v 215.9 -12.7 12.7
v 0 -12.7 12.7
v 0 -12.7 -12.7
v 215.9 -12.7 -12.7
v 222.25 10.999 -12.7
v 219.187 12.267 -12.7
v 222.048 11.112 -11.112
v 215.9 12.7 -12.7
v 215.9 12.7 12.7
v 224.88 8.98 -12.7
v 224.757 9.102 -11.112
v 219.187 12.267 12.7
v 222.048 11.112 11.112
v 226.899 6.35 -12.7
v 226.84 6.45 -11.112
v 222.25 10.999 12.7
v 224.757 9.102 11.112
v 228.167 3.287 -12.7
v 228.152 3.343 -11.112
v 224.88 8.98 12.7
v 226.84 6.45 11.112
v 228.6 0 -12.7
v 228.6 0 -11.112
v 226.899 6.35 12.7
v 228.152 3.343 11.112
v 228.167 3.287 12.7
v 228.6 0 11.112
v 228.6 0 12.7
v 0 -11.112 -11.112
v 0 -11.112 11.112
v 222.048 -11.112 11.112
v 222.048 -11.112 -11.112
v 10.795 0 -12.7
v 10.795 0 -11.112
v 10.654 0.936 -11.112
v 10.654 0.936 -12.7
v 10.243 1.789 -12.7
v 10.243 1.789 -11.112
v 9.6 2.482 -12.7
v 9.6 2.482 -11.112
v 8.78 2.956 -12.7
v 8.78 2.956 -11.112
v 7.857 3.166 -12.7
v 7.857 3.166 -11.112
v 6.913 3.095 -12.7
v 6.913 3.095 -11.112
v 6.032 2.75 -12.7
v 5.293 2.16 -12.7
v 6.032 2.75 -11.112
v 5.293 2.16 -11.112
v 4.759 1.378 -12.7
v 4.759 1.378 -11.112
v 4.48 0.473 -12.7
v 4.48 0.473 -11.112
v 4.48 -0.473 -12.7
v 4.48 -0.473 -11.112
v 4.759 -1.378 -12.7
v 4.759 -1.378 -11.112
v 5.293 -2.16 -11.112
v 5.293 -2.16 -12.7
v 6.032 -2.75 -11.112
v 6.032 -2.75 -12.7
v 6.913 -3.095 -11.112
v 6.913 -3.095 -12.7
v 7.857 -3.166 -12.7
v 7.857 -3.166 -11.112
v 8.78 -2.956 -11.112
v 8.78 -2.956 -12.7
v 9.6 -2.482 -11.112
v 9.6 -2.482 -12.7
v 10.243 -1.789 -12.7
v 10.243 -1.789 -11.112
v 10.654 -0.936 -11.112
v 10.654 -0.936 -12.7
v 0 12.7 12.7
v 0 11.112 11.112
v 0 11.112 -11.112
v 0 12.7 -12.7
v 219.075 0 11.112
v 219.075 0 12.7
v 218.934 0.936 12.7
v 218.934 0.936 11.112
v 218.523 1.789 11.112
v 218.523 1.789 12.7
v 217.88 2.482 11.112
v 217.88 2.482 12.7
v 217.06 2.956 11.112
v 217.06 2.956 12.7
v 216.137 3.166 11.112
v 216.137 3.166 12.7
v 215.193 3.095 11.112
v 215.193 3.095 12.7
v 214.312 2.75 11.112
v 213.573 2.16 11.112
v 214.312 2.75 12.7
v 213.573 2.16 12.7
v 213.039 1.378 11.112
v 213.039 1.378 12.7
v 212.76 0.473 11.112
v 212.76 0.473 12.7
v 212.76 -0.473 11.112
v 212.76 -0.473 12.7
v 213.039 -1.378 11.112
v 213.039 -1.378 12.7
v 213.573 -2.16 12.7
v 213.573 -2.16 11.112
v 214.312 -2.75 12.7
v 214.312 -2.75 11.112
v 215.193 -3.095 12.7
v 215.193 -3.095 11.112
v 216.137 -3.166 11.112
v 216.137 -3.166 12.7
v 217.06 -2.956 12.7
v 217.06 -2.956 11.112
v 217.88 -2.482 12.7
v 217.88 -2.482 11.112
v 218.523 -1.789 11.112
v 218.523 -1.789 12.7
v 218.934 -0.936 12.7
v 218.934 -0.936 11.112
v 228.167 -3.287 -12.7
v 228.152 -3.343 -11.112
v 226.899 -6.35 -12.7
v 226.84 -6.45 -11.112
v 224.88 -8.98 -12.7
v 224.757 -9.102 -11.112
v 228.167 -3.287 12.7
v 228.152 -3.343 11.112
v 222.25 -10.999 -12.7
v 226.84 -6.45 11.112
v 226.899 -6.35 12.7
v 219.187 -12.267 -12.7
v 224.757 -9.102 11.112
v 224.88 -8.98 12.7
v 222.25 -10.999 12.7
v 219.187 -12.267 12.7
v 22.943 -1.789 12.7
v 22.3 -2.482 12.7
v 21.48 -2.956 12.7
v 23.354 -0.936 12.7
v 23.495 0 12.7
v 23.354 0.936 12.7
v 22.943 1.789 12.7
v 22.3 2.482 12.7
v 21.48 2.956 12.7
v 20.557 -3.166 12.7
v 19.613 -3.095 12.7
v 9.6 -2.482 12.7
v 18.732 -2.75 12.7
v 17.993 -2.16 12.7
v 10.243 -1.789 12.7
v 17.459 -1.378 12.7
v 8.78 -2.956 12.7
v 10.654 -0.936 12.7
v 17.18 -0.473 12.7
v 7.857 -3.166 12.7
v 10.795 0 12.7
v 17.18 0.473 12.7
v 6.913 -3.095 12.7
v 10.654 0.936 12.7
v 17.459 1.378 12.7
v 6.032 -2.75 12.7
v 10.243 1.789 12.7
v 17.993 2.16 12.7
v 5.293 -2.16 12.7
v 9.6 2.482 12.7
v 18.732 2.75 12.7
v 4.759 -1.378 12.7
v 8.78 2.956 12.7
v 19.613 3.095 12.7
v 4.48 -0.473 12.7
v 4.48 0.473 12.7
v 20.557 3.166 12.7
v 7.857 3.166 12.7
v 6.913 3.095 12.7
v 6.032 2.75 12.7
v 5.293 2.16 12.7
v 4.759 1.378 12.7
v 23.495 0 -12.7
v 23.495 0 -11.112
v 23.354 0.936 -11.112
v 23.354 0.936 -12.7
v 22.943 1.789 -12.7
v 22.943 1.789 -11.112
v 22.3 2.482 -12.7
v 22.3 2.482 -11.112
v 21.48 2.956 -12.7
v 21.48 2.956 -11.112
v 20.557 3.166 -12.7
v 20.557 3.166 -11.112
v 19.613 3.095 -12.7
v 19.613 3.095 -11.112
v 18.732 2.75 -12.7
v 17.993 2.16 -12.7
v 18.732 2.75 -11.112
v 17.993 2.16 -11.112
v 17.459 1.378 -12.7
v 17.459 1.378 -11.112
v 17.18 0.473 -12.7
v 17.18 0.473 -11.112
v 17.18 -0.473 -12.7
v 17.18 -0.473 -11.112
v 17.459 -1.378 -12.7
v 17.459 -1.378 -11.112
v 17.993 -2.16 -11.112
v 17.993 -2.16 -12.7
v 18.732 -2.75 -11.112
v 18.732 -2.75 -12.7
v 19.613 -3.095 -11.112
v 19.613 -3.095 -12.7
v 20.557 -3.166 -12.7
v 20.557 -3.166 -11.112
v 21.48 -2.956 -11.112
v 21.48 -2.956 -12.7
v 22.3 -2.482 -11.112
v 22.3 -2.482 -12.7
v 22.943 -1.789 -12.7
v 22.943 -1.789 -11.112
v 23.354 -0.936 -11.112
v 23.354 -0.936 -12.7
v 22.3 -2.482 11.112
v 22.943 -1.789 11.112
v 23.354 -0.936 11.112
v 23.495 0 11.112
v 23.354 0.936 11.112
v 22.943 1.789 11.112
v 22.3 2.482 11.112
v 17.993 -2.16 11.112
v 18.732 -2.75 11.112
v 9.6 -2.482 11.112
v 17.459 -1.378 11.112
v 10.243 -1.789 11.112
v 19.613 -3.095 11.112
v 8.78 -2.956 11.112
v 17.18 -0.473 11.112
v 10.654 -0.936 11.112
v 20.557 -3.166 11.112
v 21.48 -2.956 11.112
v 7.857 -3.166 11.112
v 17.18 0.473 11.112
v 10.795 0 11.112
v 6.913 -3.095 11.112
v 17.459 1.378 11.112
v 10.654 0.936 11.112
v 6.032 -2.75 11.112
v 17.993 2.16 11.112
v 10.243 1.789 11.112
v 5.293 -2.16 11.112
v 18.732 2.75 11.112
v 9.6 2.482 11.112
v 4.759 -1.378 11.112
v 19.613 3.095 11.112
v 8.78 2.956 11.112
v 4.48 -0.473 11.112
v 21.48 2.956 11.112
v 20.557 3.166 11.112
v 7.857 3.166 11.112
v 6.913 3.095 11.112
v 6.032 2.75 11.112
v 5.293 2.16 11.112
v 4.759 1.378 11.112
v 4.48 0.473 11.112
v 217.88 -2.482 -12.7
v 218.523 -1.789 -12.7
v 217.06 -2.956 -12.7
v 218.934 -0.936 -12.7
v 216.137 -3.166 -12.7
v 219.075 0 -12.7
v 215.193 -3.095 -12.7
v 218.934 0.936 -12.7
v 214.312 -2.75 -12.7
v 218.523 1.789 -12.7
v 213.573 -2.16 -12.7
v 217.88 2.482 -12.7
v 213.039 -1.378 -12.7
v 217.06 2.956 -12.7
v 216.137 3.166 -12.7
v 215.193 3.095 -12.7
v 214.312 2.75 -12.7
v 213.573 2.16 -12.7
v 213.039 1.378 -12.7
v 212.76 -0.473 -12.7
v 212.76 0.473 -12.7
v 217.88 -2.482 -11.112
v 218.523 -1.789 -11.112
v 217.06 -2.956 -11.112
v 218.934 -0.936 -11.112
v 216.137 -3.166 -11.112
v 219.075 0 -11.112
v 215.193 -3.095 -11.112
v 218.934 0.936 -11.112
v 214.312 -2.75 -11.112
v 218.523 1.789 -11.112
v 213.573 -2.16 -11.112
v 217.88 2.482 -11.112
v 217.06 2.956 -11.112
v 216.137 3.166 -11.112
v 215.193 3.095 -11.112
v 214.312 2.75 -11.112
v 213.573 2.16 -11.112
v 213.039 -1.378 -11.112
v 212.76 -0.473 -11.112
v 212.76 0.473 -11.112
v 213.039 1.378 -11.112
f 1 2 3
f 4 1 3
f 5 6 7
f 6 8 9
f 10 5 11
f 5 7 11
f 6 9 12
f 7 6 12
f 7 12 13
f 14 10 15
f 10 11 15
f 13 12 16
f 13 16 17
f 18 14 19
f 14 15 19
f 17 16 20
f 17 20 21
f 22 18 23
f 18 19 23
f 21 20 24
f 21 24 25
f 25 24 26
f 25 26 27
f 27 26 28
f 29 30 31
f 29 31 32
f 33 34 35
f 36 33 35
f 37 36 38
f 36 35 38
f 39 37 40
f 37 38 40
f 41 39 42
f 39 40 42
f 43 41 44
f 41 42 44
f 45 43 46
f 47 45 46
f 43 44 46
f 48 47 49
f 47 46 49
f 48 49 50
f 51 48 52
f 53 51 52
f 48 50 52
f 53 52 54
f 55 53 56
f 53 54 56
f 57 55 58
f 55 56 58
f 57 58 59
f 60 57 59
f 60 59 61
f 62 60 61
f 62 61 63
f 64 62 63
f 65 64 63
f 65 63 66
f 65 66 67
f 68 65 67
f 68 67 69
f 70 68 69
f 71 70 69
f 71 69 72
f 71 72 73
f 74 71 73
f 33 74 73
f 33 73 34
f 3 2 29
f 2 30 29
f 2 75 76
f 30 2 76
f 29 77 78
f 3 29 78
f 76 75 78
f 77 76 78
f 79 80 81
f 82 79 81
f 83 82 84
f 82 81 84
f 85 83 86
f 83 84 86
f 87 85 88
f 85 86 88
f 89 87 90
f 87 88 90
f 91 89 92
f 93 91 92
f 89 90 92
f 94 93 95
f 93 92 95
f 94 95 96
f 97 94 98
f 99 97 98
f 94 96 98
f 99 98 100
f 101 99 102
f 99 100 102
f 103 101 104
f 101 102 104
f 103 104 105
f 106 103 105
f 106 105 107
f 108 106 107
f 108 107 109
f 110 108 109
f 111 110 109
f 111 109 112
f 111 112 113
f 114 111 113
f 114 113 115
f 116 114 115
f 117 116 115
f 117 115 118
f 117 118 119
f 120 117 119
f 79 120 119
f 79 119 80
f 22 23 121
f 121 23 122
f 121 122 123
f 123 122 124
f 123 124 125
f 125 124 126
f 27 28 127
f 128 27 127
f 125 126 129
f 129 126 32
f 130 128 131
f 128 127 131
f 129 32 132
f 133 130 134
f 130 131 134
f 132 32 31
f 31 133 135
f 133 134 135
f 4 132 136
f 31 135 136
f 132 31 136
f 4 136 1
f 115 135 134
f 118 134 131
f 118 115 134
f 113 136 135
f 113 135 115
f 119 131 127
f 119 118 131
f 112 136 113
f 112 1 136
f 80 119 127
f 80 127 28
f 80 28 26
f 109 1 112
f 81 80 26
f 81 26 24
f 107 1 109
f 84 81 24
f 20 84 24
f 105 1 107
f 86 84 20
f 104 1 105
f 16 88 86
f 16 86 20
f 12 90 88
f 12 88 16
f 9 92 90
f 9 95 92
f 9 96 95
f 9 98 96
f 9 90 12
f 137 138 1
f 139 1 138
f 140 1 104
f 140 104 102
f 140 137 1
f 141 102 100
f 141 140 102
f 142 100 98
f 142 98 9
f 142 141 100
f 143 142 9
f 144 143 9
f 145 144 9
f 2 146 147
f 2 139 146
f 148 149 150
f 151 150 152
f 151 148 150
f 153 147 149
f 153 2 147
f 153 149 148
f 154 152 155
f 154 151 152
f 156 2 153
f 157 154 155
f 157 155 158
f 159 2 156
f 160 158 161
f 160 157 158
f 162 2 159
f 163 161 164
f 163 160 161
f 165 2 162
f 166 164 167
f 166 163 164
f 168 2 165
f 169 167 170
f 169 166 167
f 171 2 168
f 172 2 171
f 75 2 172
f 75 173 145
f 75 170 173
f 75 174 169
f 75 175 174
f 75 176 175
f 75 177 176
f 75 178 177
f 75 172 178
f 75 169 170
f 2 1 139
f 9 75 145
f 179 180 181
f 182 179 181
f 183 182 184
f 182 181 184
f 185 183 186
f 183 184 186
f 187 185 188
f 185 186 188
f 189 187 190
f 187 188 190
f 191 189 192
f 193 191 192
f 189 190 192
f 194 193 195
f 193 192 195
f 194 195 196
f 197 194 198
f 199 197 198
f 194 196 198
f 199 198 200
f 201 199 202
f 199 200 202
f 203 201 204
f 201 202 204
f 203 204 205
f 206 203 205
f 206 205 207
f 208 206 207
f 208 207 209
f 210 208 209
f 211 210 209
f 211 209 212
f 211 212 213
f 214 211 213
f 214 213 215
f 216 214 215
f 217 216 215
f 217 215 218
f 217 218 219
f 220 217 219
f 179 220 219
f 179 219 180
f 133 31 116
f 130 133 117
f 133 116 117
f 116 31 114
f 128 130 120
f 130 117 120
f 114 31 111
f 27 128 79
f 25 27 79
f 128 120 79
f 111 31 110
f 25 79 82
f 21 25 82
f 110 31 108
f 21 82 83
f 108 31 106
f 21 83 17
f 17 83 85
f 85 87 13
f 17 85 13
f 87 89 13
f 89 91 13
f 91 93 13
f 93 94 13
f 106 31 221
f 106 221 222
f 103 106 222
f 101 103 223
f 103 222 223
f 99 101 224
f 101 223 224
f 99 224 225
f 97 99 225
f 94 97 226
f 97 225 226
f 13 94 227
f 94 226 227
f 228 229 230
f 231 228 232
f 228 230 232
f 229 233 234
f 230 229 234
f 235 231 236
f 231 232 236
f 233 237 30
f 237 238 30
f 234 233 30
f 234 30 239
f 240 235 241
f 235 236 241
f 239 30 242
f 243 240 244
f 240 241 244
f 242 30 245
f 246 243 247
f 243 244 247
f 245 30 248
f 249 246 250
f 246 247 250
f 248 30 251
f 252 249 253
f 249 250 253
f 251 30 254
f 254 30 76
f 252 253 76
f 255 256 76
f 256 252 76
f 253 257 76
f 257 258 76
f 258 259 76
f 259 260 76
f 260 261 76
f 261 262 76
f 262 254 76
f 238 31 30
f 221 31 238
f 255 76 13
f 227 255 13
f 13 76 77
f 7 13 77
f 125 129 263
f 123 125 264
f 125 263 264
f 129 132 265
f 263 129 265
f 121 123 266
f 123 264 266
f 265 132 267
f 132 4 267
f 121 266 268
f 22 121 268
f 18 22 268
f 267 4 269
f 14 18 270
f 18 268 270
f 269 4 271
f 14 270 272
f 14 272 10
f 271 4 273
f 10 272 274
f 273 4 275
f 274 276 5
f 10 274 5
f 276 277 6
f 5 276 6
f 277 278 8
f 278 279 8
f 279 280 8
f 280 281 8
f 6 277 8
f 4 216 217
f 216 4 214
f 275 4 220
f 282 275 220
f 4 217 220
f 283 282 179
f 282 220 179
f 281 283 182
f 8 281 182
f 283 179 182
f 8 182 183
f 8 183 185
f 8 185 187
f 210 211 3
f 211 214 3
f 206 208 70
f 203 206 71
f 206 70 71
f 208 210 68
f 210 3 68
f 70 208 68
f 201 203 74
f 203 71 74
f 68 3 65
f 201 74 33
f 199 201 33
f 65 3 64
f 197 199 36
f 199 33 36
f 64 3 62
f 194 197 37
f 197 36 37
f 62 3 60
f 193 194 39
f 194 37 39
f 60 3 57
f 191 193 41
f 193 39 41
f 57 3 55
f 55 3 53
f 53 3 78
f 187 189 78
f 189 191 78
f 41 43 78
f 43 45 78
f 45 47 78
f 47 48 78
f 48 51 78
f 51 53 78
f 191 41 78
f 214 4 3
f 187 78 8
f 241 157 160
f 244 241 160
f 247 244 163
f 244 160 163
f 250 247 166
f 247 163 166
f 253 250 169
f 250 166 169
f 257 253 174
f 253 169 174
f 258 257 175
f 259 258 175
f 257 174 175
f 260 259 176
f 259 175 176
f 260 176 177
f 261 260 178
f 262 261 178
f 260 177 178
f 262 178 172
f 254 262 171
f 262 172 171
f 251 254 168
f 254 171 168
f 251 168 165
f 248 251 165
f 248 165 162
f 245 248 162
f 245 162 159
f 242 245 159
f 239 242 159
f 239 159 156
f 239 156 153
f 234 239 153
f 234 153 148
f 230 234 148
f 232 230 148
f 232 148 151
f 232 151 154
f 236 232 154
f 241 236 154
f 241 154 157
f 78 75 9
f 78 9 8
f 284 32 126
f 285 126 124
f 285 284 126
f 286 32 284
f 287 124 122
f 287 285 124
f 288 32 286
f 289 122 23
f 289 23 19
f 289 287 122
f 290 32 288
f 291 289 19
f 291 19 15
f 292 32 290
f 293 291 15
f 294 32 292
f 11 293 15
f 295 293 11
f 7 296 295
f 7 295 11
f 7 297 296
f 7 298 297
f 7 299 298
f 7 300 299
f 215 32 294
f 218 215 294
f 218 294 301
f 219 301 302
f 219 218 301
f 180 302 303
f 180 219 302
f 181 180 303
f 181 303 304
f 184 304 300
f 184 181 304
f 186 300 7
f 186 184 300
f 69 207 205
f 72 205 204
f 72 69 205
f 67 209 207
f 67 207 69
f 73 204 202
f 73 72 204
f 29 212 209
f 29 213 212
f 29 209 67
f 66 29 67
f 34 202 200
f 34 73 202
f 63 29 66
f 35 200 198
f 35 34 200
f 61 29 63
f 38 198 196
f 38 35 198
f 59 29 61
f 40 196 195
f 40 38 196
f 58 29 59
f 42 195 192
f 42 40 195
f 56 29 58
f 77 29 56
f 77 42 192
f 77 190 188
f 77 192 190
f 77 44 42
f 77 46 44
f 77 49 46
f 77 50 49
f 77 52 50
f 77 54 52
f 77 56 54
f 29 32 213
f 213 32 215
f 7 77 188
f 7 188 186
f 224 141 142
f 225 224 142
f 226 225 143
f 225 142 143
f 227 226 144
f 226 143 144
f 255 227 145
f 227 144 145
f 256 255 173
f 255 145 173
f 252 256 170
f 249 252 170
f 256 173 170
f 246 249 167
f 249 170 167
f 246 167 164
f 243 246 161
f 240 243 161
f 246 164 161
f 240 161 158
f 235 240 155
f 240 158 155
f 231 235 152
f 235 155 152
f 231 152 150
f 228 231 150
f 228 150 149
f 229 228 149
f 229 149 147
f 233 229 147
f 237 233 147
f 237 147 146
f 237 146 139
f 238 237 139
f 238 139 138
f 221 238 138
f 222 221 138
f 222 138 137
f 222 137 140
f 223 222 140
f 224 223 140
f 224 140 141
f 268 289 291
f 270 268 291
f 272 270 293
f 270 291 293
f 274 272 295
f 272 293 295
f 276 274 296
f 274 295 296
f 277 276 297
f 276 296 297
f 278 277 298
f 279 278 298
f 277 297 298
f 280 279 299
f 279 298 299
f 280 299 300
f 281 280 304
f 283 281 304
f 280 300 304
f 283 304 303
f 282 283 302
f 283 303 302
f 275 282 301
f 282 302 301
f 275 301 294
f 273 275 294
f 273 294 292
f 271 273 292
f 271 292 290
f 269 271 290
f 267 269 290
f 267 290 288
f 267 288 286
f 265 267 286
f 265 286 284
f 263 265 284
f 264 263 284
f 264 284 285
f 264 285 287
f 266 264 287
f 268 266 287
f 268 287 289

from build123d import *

# Parameters (mm, degrees)
SKETCH1_W           = 25.4
SKETCH1_H           = 25.4
SKETCH1_W_2         = 22.225
SKETCH1_H_2         = 22.225
BOSS_EXTRUDE1_DEPTH = 228.6
SKETCH2_R           = 3.175
CUT_EXTRUDE1_DEPTH  = 26.4
CUT_EXTRUDE2_DEPTH  = 26.4


with BuildPart() as part:
    # Sketch1 → Boss-Extrude1 (new body)
    with BuildSketch(Plane(origin=(0, 0, 0), x_dir=(0, 0, -1), z_dir=(1, 0, 0))):
        Rectangle(SKETCH1_W, SKETCH1_H)
        Rectangle(SKETCH1_W_2, SKETCH1_H_2, mode=Mode.SUBTRACT)
    extrude(amount=BOSS_EXTRUDE1_DEPTH)

    # Sketch2 → Cut-Extrude1 (cut, through all)
    with BuildSketch(Plane.XY.offset(12.7)):
        with Locations((215.9, 0)):
            Circle(SKETCH2_R)
        with Locations((7.62, 0)):
            Circle(SKETCH2_R)
        with Locations((20.32, 0)):
            Circle(SKETCH2_R)
    extrude(amount=-CUT_EXTRUDE1_DEPTH, mode=Mode.SUBTRACT)

    # Sketch3 → Cut-Extrude2 (cut, through all)
    with BuildSketch(Plane.XY.offset(12.7)):
        with BuildLine():
            Line((228.6, 12.7), (215.9, 12.7))
            ThreePointArc((215.9, 12.7), (224.880256121, 8.980256121), (228.6, 0))
            Line((228.6, 0), (228.6, 12.7))
        make_face()
        with BuildLine():
            Line((228.6, -12.7), (228.6, 0))
            ThreePointArc((228.6, 0), (224.880256121, -8.980256121), (215.9, -12.7))
            Line((215.9, -12.7), (228.6, -12.7))
        make_face()
    extrude(amount=-CUT_EXTRUDE2_DEPTH, mode=Mode.SUBTRACT)


solid = part.part
